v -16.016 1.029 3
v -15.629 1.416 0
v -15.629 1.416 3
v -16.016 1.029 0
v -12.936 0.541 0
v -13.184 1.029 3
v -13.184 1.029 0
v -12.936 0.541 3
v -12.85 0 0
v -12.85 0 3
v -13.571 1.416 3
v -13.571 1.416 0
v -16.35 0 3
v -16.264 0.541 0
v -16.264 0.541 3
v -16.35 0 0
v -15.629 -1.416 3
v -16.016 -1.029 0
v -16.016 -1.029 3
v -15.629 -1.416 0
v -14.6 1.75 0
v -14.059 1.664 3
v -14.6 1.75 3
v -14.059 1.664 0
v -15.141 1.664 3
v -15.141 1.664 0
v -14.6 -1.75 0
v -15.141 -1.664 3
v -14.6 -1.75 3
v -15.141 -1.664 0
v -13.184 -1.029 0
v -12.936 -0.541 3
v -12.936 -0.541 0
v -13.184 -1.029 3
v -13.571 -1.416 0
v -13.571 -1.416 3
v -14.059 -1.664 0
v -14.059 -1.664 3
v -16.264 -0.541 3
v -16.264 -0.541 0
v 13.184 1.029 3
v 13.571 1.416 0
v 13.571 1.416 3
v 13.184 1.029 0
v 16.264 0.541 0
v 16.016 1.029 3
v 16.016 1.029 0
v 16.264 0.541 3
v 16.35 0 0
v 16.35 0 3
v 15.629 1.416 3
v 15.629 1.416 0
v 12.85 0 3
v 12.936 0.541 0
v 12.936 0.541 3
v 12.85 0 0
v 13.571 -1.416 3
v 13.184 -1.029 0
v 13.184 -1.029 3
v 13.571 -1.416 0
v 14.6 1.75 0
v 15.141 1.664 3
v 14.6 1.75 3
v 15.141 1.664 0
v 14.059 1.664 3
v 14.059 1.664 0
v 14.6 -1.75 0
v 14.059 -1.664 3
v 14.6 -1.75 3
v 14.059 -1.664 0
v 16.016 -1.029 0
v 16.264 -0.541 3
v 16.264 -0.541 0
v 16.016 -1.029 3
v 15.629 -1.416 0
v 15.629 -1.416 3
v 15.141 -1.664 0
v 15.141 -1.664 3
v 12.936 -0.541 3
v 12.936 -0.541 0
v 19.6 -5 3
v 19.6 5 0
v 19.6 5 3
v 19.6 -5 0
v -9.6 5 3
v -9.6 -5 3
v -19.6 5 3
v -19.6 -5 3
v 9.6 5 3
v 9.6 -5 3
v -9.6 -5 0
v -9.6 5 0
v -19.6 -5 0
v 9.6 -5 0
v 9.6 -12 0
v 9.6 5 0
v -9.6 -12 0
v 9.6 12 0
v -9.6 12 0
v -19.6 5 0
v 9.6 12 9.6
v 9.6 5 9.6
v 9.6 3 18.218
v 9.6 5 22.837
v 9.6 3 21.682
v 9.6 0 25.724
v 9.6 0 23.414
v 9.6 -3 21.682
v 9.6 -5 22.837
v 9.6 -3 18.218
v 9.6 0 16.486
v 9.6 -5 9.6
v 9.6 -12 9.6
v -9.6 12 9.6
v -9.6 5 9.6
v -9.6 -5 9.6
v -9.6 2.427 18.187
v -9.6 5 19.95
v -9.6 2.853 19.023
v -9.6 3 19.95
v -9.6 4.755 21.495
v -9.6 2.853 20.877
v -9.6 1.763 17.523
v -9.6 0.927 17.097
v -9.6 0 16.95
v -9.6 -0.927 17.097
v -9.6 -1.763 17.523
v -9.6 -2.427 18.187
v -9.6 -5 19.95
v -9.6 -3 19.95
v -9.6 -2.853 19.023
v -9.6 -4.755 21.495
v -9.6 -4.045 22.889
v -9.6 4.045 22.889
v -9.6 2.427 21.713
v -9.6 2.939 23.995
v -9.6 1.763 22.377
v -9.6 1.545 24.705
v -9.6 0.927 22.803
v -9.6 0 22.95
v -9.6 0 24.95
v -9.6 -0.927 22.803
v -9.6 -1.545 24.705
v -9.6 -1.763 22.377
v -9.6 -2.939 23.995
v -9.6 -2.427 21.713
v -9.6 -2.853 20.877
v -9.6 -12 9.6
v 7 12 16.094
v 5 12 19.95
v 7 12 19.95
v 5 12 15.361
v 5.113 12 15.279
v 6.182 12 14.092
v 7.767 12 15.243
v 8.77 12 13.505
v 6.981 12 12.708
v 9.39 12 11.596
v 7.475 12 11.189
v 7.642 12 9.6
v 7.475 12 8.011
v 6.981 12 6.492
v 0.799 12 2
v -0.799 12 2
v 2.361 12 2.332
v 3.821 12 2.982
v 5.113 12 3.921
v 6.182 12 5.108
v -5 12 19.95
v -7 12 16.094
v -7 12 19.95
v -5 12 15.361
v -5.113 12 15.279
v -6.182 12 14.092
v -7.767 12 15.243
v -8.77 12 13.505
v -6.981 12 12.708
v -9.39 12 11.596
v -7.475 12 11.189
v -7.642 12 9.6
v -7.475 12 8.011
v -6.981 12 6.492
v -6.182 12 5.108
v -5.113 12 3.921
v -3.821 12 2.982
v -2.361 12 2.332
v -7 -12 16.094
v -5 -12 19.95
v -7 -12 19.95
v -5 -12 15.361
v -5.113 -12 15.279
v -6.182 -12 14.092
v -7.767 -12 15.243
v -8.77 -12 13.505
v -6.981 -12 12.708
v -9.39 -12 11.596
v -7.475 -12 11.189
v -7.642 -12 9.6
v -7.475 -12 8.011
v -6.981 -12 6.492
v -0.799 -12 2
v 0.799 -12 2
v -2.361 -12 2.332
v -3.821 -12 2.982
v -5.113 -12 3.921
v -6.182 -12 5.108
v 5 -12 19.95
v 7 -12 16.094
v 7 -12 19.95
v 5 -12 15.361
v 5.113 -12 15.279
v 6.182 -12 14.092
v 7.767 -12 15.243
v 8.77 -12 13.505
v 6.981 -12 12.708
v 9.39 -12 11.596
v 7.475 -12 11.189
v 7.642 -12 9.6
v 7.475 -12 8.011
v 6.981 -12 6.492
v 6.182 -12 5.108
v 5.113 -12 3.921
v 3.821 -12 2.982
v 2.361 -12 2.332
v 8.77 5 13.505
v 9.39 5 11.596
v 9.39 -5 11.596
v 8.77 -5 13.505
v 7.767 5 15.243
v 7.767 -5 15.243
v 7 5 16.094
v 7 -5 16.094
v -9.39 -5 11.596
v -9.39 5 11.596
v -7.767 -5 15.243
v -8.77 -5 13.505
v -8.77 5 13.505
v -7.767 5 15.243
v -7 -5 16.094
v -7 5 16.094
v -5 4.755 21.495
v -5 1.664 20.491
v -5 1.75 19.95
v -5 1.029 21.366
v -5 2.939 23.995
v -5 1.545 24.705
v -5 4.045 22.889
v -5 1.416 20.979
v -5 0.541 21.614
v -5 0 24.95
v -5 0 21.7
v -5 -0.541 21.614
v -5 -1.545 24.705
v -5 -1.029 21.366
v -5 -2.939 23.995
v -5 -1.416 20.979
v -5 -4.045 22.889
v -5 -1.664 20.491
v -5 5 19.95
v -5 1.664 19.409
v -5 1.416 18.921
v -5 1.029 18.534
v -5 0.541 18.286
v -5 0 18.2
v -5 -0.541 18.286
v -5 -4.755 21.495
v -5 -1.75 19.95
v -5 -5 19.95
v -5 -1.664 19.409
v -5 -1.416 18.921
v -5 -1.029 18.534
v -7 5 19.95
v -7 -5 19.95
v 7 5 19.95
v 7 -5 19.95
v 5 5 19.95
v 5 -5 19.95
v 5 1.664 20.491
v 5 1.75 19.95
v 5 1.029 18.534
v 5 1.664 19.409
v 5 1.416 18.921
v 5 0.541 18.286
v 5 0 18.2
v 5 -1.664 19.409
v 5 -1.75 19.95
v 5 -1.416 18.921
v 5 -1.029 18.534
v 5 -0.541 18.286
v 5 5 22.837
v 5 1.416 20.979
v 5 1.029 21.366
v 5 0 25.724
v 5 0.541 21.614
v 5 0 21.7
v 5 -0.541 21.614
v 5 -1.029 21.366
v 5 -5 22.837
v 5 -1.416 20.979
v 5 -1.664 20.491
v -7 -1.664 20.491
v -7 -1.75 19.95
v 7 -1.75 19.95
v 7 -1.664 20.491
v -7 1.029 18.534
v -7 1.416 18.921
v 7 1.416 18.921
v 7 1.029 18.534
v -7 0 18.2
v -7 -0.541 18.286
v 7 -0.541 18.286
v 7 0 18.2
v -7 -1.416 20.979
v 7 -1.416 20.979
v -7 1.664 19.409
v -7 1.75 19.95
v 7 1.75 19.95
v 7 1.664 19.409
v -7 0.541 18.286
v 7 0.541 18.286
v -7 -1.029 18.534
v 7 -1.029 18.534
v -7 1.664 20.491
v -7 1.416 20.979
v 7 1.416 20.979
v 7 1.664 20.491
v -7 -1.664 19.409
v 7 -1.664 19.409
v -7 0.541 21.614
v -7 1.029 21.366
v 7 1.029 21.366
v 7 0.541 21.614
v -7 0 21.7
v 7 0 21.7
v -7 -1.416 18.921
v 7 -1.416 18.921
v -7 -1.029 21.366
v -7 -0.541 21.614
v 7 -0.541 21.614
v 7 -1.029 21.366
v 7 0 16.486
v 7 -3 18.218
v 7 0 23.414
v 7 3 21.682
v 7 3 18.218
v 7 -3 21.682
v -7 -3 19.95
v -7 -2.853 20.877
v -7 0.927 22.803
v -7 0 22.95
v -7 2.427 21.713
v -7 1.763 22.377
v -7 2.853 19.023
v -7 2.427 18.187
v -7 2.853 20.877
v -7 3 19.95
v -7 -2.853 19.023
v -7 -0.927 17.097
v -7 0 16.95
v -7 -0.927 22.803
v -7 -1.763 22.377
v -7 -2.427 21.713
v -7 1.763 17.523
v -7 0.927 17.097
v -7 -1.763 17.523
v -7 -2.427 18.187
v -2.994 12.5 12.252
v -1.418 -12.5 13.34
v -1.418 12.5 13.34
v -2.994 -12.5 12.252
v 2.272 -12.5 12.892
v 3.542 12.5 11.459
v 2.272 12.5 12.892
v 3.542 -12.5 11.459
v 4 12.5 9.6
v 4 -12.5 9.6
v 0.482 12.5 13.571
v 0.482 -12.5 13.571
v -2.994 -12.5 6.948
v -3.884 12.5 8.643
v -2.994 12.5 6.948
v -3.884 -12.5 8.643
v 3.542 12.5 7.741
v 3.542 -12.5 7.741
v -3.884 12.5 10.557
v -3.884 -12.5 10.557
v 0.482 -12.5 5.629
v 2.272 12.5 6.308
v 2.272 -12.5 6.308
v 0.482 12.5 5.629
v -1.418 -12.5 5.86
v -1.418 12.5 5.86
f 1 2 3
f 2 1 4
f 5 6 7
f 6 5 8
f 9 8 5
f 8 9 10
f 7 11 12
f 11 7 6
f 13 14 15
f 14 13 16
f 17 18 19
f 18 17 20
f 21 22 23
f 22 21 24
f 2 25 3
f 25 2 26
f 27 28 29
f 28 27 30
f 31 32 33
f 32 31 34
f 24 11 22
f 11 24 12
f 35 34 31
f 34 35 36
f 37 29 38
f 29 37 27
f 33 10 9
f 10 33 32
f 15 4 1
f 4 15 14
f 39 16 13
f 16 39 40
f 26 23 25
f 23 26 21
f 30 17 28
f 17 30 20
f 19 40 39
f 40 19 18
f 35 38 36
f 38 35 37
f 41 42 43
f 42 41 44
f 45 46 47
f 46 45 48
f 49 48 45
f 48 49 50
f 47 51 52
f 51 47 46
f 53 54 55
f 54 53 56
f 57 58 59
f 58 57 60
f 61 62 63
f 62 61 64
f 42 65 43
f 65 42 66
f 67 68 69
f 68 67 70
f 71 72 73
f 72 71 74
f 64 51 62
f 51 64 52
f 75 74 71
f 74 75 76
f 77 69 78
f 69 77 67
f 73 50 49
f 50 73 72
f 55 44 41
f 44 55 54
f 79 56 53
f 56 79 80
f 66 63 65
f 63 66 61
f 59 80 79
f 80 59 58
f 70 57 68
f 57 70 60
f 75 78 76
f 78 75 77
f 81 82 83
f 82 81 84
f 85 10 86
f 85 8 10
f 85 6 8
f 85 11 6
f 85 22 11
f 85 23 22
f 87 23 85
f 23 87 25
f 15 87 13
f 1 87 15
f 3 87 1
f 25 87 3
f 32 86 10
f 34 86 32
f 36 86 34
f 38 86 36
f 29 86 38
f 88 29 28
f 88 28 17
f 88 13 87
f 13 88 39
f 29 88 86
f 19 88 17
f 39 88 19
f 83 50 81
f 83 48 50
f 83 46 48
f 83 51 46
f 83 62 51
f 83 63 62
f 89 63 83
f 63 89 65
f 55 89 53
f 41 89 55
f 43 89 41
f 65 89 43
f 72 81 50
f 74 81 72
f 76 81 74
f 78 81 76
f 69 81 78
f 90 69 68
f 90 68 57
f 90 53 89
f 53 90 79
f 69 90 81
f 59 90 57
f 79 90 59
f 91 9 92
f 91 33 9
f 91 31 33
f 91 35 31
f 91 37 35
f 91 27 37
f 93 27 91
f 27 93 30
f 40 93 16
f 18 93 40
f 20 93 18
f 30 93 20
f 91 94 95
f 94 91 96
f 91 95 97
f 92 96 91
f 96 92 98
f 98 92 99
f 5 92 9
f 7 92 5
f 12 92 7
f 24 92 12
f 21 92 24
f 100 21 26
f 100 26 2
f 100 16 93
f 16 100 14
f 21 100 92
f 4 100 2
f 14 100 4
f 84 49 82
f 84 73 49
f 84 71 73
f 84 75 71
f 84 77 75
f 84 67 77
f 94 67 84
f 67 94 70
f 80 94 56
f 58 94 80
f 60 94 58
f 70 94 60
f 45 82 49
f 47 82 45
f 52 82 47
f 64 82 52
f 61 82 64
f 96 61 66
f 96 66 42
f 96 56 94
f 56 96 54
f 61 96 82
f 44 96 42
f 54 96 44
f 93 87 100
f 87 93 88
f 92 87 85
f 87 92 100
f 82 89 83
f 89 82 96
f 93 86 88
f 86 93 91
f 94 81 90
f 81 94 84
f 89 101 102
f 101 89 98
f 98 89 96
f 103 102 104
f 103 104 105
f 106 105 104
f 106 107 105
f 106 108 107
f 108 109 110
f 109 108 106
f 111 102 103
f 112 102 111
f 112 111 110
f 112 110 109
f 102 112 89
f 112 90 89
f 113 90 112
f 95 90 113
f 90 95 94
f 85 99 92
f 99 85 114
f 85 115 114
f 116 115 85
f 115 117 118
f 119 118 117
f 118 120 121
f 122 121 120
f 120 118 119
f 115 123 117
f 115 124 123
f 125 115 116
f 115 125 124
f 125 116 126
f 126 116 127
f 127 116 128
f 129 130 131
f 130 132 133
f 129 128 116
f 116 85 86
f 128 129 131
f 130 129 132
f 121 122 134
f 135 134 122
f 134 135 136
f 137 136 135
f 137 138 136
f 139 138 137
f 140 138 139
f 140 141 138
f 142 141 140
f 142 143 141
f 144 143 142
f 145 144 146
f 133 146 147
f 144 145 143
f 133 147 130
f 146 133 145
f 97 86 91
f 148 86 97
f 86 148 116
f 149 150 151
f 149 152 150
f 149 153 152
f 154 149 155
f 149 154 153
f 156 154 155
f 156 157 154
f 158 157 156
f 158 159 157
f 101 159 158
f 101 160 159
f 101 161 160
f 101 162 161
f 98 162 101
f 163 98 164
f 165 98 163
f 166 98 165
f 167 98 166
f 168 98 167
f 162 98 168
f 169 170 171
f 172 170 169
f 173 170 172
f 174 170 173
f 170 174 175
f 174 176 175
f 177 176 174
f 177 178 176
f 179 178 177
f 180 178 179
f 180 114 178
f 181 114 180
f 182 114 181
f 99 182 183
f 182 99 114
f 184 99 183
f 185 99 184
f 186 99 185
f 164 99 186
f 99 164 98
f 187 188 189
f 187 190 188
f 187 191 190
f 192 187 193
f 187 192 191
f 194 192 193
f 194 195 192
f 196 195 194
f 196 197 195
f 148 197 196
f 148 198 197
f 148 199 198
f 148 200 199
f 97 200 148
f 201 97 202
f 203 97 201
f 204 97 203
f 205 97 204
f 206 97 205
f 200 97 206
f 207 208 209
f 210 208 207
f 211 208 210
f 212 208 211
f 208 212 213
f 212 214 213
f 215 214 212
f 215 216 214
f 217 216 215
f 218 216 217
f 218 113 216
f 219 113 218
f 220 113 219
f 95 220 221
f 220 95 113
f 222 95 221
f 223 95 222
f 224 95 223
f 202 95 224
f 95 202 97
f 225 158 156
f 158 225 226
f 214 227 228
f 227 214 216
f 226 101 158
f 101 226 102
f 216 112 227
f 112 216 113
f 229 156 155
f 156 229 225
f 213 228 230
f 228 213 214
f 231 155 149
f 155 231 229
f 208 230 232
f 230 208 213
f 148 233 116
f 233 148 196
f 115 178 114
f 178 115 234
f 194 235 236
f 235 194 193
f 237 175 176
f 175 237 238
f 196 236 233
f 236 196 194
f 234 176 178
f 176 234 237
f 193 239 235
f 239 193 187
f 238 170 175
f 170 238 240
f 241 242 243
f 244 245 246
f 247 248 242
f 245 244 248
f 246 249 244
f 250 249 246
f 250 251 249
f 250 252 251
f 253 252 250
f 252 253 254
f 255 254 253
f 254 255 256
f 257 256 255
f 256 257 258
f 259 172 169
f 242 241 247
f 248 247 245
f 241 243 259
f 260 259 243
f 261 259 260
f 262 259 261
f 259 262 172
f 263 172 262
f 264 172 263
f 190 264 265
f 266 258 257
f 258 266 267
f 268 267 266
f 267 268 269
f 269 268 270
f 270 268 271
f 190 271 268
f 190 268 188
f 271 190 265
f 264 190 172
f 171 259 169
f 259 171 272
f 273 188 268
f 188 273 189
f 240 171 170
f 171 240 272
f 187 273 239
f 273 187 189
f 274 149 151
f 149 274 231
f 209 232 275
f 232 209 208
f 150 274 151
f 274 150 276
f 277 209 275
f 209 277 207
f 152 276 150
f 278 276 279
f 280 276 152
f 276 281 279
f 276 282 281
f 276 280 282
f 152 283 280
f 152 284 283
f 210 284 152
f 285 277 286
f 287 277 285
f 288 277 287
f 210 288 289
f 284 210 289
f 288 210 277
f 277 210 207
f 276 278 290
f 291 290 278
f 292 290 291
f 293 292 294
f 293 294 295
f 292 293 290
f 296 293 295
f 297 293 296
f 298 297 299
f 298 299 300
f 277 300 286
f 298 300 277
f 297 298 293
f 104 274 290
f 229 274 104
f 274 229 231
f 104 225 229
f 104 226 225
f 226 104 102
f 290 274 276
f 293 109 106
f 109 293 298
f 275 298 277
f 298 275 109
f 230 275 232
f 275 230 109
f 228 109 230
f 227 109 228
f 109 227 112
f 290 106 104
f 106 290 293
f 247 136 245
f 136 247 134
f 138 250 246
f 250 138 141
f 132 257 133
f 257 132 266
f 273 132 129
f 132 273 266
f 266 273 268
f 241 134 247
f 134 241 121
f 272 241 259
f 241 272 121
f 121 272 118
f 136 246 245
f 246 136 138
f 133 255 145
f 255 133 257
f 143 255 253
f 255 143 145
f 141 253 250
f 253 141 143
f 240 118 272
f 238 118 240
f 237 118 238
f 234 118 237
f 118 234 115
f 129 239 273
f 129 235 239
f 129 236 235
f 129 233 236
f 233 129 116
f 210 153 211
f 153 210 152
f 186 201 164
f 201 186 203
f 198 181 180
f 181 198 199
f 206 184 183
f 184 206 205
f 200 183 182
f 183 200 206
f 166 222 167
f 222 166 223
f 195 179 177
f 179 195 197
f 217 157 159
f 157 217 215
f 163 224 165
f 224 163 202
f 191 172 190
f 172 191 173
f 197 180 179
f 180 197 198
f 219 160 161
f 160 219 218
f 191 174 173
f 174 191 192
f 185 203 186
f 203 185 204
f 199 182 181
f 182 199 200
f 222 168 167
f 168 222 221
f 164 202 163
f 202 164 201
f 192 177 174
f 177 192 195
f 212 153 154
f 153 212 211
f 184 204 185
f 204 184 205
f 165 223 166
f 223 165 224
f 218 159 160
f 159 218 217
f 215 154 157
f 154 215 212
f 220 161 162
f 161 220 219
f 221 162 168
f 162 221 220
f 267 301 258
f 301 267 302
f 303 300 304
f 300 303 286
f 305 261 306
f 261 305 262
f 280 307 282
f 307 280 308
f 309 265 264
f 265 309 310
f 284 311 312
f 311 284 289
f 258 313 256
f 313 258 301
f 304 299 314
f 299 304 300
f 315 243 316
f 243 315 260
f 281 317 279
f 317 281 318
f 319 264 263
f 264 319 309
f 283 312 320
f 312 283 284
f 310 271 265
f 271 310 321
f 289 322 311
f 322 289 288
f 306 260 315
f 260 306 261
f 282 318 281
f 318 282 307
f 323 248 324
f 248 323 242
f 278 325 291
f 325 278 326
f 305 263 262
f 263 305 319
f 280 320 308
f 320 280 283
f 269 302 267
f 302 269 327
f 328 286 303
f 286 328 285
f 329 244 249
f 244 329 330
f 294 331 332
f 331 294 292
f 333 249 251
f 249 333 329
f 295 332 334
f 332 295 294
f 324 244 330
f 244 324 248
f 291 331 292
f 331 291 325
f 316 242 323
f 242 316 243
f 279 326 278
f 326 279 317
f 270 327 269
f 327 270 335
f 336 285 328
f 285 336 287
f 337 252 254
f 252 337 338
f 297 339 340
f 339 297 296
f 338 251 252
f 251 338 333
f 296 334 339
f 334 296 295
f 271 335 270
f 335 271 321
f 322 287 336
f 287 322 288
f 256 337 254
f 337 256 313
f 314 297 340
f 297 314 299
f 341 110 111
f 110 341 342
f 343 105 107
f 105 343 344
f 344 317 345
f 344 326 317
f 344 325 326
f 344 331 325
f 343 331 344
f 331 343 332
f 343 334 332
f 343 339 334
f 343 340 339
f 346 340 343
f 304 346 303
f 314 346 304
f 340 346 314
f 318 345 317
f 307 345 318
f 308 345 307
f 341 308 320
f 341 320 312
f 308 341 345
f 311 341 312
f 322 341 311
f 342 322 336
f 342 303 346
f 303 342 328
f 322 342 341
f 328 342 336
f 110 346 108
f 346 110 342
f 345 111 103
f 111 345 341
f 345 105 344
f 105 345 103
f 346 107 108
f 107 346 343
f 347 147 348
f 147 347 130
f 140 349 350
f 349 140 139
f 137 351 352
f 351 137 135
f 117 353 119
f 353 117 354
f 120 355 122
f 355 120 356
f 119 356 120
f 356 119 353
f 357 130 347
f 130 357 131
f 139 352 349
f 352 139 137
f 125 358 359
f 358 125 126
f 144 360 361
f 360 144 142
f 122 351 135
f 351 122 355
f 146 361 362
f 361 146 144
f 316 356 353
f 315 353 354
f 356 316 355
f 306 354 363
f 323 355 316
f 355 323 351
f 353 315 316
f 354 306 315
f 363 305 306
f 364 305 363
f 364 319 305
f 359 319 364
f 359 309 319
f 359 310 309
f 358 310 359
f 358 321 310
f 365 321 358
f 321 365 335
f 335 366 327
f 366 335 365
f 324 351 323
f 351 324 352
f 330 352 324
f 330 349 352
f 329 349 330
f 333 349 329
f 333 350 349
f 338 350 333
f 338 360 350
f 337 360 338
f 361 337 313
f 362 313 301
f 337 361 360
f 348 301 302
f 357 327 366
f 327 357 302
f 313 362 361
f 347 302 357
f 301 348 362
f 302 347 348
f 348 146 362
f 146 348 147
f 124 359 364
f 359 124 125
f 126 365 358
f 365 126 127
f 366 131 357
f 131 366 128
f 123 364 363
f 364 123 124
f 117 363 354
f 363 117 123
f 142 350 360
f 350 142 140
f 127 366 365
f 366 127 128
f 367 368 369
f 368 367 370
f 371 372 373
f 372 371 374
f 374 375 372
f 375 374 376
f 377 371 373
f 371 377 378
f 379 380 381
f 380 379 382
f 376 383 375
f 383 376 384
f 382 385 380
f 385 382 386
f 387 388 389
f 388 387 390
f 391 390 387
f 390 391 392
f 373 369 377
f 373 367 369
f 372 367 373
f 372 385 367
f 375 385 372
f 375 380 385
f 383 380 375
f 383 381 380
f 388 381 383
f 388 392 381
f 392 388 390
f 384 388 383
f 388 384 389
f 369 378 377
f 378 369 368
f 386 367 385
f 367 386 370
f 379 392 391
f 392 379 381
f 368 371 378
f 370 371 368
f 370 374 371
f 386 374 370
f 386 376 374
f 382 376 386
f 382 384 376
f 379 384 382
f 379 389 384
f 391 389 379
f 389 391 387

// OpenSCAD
// LM8UU holder slim v1.1
// *********************************************
// Jonas Kühling
// http://www.jonaskuehling.de
// http://www.thingiverse.com/jonaskuehling
// *********************************************
// derived from:
// http://www.thingiverse.com/thing:14942

// LM8UU/rod dimensions
LM8UU_dia = 15.2;
LM8UU_length = 24;
rod_dia = 8;

//screw/nut dimensions (M3) - hexagon socket head cap screw ISO 4762, hexagon nut ISO 4032
screw_thread_dia_iso = 3;
screw_head_dia_iso = 5.5;
nut_wrench_size_iso = 5.5;


// screw/nut dimensions for use (plus clearance for fitting purpose)
clearance_dia = 0.5;
screw_thread_dia = screw_thread_dia_iso + clearance_dia;
screw_head_dia = screw_head_dia_iso + clearance_dia;
nut_wrench_size = nut_wrench_size_iso + clearance_dia;
nut_dia_perimeter = (nut_wrench_size/cos(30));
nut_dia = nut_dia_perimeter;
nut_surround_thickness = 2;

// main body dimensions
body_wall_thickness = 2;
body_width = LM8UU_dia + (2*body_wall_thickness);
body_height = body_width;
body_length = LM8UU_length;
gap_width = rod_dia + 2;
screw_bushing_space = 1;
screw_elevation = LM8UU_dia + body_wall_thickness + (screw_thread_dia/2) +screw_bushing_space;

// TEST - uncomment to render in openscad:
// lm8uu_holder(1);		// WITH mountplate
// lm8uu_holder();		// WITHOUT mountplate


// nophead's polyhole module for better lm8uu-fit
module polyhole(d,h) {
    n = max(round(2 * d),3);
    rotate([0,0,180])
        cylinder(h = h, r = (d / 2) / cos (180 / n), $fn = n);
}


module mount_plate()
{
	difference()
	{
		translate([0,0,1.5])
		cube([body_width+2*screw_head_dia+4*nut_surround_thickness,screw_head_dia+2*nut_surround_thickness,3], center=true);

		for(i=[-1,1])
			translate([i*(body_width/2+nut_surround_thickness+screw_head_dia/2),0,-0.5])
				cylinder(r=screw_thread_dia/2, h=4, $fn=20);
	}
}

// main body
module lm8uu_holder(with_mountplate=false)
{
	difference()
	{
		union()
		{
			if (with_mountplate) 
			mount_plate();
	
			// body
			translate([0,0,body_height/4])
				cube([body_width,body_length,body_height/2], center=true);
			translate([0,0,(LM8UU_dia/2)+body_wall_thickness])		
				rotate([90,0,0])
					cylinder(r=(LM8UU_dia/2)+body_wall_thickness, h=LM8UU_length, center=true);
	
			// gap support
			translate([-(gap_width/2)-body_wall_thickness,-(body_length/2),body_height/2])
				cube([body_wall_thickness,LM8UU_length,(LM8UU_dia/2)+screw_bushing_space+(screw_thread_dia/2)]);
			translate([gap_width/2,-(body_length/2),body_height/2])
				cube([body_wall_thickness,LM8UU_length,(LM8UU_dia/2)+screw_bushing_space+(screw_thread_dia/2)]);
	
	
			// nut trap surround
			translate([gap_width/2,0,screw_elevation])
				rotate([0,90,0])
					cylinder(r=(((nut_wrench_size+nut_surround_thickness*2)/cos(30))/2), h=(body_width-gap_width)/2, $fn=6);
			translate([gap_width/2+(body_width-gap_width)/4,0,screw_elevation/2])
				cube([(body_width-gap_width)/2,nut_wrench_size+(nut_surround_thickness*2),screw_elevation],center=true);

			// Screw hole surround
			translate([-gap_width/2,0,screw_elevation])
				rotate([0,-90,0])
					cylinder(r=(screw_head_dia/2)+nut_surround_thickness, h=(body_width-gap_width)/2, $fn=20);
			translate([-(gap_width/2+(body_width-gap_width)/4),0,screw_elevation/2])
				cube([(body_width-gap_width)/2,screw_head_dia+(nut_surround_thickness*2),screw_elevation],center=true);
		}
	
		// bushing hole
		translate([0,0,LM8UU_dia/2+2])
			rotate([90,0,0])
//				cylinder(r=LM8UU_dia/2, h=LM8UU_length+1, center=true);
				translate([0,0,-(LM8UU_length+1)/2]) polyhole(LM8UU_dia,LM8UU_length+1);	// TESTING POLYHOLE MODULE FOR BETTER LM8UU FIT
	
		// top gap
		translate([-(gap_width/2),-(body_length/2)-1,body_height/2])
			cube([gap_width,LM8UU_length+2,(LM8UU_dia/2)+screw_bushing_space+(screw_thread_dia/2)+(nut_dia/2)+nut_surround_thickness+1]);
	
		// screw hole (one all the way through)
		translate([0,0,screw_elevation])
			rotate([0,90,0])
				cylinder(r=screw_thread_dia/2, h=body_width+3, center=true, $fn=20);
	
		// nut trap
		translate([gap_width/2+body_wall_thickness,0,screw_elevation])
			rotate([0,90,0])
				cylinder(r=nut_dia/2, h=body_width/2-gap_width/2-body_wall_thickness+1,$fn=6);
	
		// screw head hole
		translate([-(gap_width)/2-body_wall_thickness,0,screw_elevation])
			rotate([0,-90,0])
				cylinder(r=screw_head_dia/2, h=body_width/2-gap_width/2-body_wall_thickness+1,$fn=20);
	
	}
}

lm8uu_holder(1);

		translate([0,0,LM8UU_dia/2+2])
			rotate([90,0,0])
				cylinder(r=8/2, h=LM8UU_length+1, center=true);
